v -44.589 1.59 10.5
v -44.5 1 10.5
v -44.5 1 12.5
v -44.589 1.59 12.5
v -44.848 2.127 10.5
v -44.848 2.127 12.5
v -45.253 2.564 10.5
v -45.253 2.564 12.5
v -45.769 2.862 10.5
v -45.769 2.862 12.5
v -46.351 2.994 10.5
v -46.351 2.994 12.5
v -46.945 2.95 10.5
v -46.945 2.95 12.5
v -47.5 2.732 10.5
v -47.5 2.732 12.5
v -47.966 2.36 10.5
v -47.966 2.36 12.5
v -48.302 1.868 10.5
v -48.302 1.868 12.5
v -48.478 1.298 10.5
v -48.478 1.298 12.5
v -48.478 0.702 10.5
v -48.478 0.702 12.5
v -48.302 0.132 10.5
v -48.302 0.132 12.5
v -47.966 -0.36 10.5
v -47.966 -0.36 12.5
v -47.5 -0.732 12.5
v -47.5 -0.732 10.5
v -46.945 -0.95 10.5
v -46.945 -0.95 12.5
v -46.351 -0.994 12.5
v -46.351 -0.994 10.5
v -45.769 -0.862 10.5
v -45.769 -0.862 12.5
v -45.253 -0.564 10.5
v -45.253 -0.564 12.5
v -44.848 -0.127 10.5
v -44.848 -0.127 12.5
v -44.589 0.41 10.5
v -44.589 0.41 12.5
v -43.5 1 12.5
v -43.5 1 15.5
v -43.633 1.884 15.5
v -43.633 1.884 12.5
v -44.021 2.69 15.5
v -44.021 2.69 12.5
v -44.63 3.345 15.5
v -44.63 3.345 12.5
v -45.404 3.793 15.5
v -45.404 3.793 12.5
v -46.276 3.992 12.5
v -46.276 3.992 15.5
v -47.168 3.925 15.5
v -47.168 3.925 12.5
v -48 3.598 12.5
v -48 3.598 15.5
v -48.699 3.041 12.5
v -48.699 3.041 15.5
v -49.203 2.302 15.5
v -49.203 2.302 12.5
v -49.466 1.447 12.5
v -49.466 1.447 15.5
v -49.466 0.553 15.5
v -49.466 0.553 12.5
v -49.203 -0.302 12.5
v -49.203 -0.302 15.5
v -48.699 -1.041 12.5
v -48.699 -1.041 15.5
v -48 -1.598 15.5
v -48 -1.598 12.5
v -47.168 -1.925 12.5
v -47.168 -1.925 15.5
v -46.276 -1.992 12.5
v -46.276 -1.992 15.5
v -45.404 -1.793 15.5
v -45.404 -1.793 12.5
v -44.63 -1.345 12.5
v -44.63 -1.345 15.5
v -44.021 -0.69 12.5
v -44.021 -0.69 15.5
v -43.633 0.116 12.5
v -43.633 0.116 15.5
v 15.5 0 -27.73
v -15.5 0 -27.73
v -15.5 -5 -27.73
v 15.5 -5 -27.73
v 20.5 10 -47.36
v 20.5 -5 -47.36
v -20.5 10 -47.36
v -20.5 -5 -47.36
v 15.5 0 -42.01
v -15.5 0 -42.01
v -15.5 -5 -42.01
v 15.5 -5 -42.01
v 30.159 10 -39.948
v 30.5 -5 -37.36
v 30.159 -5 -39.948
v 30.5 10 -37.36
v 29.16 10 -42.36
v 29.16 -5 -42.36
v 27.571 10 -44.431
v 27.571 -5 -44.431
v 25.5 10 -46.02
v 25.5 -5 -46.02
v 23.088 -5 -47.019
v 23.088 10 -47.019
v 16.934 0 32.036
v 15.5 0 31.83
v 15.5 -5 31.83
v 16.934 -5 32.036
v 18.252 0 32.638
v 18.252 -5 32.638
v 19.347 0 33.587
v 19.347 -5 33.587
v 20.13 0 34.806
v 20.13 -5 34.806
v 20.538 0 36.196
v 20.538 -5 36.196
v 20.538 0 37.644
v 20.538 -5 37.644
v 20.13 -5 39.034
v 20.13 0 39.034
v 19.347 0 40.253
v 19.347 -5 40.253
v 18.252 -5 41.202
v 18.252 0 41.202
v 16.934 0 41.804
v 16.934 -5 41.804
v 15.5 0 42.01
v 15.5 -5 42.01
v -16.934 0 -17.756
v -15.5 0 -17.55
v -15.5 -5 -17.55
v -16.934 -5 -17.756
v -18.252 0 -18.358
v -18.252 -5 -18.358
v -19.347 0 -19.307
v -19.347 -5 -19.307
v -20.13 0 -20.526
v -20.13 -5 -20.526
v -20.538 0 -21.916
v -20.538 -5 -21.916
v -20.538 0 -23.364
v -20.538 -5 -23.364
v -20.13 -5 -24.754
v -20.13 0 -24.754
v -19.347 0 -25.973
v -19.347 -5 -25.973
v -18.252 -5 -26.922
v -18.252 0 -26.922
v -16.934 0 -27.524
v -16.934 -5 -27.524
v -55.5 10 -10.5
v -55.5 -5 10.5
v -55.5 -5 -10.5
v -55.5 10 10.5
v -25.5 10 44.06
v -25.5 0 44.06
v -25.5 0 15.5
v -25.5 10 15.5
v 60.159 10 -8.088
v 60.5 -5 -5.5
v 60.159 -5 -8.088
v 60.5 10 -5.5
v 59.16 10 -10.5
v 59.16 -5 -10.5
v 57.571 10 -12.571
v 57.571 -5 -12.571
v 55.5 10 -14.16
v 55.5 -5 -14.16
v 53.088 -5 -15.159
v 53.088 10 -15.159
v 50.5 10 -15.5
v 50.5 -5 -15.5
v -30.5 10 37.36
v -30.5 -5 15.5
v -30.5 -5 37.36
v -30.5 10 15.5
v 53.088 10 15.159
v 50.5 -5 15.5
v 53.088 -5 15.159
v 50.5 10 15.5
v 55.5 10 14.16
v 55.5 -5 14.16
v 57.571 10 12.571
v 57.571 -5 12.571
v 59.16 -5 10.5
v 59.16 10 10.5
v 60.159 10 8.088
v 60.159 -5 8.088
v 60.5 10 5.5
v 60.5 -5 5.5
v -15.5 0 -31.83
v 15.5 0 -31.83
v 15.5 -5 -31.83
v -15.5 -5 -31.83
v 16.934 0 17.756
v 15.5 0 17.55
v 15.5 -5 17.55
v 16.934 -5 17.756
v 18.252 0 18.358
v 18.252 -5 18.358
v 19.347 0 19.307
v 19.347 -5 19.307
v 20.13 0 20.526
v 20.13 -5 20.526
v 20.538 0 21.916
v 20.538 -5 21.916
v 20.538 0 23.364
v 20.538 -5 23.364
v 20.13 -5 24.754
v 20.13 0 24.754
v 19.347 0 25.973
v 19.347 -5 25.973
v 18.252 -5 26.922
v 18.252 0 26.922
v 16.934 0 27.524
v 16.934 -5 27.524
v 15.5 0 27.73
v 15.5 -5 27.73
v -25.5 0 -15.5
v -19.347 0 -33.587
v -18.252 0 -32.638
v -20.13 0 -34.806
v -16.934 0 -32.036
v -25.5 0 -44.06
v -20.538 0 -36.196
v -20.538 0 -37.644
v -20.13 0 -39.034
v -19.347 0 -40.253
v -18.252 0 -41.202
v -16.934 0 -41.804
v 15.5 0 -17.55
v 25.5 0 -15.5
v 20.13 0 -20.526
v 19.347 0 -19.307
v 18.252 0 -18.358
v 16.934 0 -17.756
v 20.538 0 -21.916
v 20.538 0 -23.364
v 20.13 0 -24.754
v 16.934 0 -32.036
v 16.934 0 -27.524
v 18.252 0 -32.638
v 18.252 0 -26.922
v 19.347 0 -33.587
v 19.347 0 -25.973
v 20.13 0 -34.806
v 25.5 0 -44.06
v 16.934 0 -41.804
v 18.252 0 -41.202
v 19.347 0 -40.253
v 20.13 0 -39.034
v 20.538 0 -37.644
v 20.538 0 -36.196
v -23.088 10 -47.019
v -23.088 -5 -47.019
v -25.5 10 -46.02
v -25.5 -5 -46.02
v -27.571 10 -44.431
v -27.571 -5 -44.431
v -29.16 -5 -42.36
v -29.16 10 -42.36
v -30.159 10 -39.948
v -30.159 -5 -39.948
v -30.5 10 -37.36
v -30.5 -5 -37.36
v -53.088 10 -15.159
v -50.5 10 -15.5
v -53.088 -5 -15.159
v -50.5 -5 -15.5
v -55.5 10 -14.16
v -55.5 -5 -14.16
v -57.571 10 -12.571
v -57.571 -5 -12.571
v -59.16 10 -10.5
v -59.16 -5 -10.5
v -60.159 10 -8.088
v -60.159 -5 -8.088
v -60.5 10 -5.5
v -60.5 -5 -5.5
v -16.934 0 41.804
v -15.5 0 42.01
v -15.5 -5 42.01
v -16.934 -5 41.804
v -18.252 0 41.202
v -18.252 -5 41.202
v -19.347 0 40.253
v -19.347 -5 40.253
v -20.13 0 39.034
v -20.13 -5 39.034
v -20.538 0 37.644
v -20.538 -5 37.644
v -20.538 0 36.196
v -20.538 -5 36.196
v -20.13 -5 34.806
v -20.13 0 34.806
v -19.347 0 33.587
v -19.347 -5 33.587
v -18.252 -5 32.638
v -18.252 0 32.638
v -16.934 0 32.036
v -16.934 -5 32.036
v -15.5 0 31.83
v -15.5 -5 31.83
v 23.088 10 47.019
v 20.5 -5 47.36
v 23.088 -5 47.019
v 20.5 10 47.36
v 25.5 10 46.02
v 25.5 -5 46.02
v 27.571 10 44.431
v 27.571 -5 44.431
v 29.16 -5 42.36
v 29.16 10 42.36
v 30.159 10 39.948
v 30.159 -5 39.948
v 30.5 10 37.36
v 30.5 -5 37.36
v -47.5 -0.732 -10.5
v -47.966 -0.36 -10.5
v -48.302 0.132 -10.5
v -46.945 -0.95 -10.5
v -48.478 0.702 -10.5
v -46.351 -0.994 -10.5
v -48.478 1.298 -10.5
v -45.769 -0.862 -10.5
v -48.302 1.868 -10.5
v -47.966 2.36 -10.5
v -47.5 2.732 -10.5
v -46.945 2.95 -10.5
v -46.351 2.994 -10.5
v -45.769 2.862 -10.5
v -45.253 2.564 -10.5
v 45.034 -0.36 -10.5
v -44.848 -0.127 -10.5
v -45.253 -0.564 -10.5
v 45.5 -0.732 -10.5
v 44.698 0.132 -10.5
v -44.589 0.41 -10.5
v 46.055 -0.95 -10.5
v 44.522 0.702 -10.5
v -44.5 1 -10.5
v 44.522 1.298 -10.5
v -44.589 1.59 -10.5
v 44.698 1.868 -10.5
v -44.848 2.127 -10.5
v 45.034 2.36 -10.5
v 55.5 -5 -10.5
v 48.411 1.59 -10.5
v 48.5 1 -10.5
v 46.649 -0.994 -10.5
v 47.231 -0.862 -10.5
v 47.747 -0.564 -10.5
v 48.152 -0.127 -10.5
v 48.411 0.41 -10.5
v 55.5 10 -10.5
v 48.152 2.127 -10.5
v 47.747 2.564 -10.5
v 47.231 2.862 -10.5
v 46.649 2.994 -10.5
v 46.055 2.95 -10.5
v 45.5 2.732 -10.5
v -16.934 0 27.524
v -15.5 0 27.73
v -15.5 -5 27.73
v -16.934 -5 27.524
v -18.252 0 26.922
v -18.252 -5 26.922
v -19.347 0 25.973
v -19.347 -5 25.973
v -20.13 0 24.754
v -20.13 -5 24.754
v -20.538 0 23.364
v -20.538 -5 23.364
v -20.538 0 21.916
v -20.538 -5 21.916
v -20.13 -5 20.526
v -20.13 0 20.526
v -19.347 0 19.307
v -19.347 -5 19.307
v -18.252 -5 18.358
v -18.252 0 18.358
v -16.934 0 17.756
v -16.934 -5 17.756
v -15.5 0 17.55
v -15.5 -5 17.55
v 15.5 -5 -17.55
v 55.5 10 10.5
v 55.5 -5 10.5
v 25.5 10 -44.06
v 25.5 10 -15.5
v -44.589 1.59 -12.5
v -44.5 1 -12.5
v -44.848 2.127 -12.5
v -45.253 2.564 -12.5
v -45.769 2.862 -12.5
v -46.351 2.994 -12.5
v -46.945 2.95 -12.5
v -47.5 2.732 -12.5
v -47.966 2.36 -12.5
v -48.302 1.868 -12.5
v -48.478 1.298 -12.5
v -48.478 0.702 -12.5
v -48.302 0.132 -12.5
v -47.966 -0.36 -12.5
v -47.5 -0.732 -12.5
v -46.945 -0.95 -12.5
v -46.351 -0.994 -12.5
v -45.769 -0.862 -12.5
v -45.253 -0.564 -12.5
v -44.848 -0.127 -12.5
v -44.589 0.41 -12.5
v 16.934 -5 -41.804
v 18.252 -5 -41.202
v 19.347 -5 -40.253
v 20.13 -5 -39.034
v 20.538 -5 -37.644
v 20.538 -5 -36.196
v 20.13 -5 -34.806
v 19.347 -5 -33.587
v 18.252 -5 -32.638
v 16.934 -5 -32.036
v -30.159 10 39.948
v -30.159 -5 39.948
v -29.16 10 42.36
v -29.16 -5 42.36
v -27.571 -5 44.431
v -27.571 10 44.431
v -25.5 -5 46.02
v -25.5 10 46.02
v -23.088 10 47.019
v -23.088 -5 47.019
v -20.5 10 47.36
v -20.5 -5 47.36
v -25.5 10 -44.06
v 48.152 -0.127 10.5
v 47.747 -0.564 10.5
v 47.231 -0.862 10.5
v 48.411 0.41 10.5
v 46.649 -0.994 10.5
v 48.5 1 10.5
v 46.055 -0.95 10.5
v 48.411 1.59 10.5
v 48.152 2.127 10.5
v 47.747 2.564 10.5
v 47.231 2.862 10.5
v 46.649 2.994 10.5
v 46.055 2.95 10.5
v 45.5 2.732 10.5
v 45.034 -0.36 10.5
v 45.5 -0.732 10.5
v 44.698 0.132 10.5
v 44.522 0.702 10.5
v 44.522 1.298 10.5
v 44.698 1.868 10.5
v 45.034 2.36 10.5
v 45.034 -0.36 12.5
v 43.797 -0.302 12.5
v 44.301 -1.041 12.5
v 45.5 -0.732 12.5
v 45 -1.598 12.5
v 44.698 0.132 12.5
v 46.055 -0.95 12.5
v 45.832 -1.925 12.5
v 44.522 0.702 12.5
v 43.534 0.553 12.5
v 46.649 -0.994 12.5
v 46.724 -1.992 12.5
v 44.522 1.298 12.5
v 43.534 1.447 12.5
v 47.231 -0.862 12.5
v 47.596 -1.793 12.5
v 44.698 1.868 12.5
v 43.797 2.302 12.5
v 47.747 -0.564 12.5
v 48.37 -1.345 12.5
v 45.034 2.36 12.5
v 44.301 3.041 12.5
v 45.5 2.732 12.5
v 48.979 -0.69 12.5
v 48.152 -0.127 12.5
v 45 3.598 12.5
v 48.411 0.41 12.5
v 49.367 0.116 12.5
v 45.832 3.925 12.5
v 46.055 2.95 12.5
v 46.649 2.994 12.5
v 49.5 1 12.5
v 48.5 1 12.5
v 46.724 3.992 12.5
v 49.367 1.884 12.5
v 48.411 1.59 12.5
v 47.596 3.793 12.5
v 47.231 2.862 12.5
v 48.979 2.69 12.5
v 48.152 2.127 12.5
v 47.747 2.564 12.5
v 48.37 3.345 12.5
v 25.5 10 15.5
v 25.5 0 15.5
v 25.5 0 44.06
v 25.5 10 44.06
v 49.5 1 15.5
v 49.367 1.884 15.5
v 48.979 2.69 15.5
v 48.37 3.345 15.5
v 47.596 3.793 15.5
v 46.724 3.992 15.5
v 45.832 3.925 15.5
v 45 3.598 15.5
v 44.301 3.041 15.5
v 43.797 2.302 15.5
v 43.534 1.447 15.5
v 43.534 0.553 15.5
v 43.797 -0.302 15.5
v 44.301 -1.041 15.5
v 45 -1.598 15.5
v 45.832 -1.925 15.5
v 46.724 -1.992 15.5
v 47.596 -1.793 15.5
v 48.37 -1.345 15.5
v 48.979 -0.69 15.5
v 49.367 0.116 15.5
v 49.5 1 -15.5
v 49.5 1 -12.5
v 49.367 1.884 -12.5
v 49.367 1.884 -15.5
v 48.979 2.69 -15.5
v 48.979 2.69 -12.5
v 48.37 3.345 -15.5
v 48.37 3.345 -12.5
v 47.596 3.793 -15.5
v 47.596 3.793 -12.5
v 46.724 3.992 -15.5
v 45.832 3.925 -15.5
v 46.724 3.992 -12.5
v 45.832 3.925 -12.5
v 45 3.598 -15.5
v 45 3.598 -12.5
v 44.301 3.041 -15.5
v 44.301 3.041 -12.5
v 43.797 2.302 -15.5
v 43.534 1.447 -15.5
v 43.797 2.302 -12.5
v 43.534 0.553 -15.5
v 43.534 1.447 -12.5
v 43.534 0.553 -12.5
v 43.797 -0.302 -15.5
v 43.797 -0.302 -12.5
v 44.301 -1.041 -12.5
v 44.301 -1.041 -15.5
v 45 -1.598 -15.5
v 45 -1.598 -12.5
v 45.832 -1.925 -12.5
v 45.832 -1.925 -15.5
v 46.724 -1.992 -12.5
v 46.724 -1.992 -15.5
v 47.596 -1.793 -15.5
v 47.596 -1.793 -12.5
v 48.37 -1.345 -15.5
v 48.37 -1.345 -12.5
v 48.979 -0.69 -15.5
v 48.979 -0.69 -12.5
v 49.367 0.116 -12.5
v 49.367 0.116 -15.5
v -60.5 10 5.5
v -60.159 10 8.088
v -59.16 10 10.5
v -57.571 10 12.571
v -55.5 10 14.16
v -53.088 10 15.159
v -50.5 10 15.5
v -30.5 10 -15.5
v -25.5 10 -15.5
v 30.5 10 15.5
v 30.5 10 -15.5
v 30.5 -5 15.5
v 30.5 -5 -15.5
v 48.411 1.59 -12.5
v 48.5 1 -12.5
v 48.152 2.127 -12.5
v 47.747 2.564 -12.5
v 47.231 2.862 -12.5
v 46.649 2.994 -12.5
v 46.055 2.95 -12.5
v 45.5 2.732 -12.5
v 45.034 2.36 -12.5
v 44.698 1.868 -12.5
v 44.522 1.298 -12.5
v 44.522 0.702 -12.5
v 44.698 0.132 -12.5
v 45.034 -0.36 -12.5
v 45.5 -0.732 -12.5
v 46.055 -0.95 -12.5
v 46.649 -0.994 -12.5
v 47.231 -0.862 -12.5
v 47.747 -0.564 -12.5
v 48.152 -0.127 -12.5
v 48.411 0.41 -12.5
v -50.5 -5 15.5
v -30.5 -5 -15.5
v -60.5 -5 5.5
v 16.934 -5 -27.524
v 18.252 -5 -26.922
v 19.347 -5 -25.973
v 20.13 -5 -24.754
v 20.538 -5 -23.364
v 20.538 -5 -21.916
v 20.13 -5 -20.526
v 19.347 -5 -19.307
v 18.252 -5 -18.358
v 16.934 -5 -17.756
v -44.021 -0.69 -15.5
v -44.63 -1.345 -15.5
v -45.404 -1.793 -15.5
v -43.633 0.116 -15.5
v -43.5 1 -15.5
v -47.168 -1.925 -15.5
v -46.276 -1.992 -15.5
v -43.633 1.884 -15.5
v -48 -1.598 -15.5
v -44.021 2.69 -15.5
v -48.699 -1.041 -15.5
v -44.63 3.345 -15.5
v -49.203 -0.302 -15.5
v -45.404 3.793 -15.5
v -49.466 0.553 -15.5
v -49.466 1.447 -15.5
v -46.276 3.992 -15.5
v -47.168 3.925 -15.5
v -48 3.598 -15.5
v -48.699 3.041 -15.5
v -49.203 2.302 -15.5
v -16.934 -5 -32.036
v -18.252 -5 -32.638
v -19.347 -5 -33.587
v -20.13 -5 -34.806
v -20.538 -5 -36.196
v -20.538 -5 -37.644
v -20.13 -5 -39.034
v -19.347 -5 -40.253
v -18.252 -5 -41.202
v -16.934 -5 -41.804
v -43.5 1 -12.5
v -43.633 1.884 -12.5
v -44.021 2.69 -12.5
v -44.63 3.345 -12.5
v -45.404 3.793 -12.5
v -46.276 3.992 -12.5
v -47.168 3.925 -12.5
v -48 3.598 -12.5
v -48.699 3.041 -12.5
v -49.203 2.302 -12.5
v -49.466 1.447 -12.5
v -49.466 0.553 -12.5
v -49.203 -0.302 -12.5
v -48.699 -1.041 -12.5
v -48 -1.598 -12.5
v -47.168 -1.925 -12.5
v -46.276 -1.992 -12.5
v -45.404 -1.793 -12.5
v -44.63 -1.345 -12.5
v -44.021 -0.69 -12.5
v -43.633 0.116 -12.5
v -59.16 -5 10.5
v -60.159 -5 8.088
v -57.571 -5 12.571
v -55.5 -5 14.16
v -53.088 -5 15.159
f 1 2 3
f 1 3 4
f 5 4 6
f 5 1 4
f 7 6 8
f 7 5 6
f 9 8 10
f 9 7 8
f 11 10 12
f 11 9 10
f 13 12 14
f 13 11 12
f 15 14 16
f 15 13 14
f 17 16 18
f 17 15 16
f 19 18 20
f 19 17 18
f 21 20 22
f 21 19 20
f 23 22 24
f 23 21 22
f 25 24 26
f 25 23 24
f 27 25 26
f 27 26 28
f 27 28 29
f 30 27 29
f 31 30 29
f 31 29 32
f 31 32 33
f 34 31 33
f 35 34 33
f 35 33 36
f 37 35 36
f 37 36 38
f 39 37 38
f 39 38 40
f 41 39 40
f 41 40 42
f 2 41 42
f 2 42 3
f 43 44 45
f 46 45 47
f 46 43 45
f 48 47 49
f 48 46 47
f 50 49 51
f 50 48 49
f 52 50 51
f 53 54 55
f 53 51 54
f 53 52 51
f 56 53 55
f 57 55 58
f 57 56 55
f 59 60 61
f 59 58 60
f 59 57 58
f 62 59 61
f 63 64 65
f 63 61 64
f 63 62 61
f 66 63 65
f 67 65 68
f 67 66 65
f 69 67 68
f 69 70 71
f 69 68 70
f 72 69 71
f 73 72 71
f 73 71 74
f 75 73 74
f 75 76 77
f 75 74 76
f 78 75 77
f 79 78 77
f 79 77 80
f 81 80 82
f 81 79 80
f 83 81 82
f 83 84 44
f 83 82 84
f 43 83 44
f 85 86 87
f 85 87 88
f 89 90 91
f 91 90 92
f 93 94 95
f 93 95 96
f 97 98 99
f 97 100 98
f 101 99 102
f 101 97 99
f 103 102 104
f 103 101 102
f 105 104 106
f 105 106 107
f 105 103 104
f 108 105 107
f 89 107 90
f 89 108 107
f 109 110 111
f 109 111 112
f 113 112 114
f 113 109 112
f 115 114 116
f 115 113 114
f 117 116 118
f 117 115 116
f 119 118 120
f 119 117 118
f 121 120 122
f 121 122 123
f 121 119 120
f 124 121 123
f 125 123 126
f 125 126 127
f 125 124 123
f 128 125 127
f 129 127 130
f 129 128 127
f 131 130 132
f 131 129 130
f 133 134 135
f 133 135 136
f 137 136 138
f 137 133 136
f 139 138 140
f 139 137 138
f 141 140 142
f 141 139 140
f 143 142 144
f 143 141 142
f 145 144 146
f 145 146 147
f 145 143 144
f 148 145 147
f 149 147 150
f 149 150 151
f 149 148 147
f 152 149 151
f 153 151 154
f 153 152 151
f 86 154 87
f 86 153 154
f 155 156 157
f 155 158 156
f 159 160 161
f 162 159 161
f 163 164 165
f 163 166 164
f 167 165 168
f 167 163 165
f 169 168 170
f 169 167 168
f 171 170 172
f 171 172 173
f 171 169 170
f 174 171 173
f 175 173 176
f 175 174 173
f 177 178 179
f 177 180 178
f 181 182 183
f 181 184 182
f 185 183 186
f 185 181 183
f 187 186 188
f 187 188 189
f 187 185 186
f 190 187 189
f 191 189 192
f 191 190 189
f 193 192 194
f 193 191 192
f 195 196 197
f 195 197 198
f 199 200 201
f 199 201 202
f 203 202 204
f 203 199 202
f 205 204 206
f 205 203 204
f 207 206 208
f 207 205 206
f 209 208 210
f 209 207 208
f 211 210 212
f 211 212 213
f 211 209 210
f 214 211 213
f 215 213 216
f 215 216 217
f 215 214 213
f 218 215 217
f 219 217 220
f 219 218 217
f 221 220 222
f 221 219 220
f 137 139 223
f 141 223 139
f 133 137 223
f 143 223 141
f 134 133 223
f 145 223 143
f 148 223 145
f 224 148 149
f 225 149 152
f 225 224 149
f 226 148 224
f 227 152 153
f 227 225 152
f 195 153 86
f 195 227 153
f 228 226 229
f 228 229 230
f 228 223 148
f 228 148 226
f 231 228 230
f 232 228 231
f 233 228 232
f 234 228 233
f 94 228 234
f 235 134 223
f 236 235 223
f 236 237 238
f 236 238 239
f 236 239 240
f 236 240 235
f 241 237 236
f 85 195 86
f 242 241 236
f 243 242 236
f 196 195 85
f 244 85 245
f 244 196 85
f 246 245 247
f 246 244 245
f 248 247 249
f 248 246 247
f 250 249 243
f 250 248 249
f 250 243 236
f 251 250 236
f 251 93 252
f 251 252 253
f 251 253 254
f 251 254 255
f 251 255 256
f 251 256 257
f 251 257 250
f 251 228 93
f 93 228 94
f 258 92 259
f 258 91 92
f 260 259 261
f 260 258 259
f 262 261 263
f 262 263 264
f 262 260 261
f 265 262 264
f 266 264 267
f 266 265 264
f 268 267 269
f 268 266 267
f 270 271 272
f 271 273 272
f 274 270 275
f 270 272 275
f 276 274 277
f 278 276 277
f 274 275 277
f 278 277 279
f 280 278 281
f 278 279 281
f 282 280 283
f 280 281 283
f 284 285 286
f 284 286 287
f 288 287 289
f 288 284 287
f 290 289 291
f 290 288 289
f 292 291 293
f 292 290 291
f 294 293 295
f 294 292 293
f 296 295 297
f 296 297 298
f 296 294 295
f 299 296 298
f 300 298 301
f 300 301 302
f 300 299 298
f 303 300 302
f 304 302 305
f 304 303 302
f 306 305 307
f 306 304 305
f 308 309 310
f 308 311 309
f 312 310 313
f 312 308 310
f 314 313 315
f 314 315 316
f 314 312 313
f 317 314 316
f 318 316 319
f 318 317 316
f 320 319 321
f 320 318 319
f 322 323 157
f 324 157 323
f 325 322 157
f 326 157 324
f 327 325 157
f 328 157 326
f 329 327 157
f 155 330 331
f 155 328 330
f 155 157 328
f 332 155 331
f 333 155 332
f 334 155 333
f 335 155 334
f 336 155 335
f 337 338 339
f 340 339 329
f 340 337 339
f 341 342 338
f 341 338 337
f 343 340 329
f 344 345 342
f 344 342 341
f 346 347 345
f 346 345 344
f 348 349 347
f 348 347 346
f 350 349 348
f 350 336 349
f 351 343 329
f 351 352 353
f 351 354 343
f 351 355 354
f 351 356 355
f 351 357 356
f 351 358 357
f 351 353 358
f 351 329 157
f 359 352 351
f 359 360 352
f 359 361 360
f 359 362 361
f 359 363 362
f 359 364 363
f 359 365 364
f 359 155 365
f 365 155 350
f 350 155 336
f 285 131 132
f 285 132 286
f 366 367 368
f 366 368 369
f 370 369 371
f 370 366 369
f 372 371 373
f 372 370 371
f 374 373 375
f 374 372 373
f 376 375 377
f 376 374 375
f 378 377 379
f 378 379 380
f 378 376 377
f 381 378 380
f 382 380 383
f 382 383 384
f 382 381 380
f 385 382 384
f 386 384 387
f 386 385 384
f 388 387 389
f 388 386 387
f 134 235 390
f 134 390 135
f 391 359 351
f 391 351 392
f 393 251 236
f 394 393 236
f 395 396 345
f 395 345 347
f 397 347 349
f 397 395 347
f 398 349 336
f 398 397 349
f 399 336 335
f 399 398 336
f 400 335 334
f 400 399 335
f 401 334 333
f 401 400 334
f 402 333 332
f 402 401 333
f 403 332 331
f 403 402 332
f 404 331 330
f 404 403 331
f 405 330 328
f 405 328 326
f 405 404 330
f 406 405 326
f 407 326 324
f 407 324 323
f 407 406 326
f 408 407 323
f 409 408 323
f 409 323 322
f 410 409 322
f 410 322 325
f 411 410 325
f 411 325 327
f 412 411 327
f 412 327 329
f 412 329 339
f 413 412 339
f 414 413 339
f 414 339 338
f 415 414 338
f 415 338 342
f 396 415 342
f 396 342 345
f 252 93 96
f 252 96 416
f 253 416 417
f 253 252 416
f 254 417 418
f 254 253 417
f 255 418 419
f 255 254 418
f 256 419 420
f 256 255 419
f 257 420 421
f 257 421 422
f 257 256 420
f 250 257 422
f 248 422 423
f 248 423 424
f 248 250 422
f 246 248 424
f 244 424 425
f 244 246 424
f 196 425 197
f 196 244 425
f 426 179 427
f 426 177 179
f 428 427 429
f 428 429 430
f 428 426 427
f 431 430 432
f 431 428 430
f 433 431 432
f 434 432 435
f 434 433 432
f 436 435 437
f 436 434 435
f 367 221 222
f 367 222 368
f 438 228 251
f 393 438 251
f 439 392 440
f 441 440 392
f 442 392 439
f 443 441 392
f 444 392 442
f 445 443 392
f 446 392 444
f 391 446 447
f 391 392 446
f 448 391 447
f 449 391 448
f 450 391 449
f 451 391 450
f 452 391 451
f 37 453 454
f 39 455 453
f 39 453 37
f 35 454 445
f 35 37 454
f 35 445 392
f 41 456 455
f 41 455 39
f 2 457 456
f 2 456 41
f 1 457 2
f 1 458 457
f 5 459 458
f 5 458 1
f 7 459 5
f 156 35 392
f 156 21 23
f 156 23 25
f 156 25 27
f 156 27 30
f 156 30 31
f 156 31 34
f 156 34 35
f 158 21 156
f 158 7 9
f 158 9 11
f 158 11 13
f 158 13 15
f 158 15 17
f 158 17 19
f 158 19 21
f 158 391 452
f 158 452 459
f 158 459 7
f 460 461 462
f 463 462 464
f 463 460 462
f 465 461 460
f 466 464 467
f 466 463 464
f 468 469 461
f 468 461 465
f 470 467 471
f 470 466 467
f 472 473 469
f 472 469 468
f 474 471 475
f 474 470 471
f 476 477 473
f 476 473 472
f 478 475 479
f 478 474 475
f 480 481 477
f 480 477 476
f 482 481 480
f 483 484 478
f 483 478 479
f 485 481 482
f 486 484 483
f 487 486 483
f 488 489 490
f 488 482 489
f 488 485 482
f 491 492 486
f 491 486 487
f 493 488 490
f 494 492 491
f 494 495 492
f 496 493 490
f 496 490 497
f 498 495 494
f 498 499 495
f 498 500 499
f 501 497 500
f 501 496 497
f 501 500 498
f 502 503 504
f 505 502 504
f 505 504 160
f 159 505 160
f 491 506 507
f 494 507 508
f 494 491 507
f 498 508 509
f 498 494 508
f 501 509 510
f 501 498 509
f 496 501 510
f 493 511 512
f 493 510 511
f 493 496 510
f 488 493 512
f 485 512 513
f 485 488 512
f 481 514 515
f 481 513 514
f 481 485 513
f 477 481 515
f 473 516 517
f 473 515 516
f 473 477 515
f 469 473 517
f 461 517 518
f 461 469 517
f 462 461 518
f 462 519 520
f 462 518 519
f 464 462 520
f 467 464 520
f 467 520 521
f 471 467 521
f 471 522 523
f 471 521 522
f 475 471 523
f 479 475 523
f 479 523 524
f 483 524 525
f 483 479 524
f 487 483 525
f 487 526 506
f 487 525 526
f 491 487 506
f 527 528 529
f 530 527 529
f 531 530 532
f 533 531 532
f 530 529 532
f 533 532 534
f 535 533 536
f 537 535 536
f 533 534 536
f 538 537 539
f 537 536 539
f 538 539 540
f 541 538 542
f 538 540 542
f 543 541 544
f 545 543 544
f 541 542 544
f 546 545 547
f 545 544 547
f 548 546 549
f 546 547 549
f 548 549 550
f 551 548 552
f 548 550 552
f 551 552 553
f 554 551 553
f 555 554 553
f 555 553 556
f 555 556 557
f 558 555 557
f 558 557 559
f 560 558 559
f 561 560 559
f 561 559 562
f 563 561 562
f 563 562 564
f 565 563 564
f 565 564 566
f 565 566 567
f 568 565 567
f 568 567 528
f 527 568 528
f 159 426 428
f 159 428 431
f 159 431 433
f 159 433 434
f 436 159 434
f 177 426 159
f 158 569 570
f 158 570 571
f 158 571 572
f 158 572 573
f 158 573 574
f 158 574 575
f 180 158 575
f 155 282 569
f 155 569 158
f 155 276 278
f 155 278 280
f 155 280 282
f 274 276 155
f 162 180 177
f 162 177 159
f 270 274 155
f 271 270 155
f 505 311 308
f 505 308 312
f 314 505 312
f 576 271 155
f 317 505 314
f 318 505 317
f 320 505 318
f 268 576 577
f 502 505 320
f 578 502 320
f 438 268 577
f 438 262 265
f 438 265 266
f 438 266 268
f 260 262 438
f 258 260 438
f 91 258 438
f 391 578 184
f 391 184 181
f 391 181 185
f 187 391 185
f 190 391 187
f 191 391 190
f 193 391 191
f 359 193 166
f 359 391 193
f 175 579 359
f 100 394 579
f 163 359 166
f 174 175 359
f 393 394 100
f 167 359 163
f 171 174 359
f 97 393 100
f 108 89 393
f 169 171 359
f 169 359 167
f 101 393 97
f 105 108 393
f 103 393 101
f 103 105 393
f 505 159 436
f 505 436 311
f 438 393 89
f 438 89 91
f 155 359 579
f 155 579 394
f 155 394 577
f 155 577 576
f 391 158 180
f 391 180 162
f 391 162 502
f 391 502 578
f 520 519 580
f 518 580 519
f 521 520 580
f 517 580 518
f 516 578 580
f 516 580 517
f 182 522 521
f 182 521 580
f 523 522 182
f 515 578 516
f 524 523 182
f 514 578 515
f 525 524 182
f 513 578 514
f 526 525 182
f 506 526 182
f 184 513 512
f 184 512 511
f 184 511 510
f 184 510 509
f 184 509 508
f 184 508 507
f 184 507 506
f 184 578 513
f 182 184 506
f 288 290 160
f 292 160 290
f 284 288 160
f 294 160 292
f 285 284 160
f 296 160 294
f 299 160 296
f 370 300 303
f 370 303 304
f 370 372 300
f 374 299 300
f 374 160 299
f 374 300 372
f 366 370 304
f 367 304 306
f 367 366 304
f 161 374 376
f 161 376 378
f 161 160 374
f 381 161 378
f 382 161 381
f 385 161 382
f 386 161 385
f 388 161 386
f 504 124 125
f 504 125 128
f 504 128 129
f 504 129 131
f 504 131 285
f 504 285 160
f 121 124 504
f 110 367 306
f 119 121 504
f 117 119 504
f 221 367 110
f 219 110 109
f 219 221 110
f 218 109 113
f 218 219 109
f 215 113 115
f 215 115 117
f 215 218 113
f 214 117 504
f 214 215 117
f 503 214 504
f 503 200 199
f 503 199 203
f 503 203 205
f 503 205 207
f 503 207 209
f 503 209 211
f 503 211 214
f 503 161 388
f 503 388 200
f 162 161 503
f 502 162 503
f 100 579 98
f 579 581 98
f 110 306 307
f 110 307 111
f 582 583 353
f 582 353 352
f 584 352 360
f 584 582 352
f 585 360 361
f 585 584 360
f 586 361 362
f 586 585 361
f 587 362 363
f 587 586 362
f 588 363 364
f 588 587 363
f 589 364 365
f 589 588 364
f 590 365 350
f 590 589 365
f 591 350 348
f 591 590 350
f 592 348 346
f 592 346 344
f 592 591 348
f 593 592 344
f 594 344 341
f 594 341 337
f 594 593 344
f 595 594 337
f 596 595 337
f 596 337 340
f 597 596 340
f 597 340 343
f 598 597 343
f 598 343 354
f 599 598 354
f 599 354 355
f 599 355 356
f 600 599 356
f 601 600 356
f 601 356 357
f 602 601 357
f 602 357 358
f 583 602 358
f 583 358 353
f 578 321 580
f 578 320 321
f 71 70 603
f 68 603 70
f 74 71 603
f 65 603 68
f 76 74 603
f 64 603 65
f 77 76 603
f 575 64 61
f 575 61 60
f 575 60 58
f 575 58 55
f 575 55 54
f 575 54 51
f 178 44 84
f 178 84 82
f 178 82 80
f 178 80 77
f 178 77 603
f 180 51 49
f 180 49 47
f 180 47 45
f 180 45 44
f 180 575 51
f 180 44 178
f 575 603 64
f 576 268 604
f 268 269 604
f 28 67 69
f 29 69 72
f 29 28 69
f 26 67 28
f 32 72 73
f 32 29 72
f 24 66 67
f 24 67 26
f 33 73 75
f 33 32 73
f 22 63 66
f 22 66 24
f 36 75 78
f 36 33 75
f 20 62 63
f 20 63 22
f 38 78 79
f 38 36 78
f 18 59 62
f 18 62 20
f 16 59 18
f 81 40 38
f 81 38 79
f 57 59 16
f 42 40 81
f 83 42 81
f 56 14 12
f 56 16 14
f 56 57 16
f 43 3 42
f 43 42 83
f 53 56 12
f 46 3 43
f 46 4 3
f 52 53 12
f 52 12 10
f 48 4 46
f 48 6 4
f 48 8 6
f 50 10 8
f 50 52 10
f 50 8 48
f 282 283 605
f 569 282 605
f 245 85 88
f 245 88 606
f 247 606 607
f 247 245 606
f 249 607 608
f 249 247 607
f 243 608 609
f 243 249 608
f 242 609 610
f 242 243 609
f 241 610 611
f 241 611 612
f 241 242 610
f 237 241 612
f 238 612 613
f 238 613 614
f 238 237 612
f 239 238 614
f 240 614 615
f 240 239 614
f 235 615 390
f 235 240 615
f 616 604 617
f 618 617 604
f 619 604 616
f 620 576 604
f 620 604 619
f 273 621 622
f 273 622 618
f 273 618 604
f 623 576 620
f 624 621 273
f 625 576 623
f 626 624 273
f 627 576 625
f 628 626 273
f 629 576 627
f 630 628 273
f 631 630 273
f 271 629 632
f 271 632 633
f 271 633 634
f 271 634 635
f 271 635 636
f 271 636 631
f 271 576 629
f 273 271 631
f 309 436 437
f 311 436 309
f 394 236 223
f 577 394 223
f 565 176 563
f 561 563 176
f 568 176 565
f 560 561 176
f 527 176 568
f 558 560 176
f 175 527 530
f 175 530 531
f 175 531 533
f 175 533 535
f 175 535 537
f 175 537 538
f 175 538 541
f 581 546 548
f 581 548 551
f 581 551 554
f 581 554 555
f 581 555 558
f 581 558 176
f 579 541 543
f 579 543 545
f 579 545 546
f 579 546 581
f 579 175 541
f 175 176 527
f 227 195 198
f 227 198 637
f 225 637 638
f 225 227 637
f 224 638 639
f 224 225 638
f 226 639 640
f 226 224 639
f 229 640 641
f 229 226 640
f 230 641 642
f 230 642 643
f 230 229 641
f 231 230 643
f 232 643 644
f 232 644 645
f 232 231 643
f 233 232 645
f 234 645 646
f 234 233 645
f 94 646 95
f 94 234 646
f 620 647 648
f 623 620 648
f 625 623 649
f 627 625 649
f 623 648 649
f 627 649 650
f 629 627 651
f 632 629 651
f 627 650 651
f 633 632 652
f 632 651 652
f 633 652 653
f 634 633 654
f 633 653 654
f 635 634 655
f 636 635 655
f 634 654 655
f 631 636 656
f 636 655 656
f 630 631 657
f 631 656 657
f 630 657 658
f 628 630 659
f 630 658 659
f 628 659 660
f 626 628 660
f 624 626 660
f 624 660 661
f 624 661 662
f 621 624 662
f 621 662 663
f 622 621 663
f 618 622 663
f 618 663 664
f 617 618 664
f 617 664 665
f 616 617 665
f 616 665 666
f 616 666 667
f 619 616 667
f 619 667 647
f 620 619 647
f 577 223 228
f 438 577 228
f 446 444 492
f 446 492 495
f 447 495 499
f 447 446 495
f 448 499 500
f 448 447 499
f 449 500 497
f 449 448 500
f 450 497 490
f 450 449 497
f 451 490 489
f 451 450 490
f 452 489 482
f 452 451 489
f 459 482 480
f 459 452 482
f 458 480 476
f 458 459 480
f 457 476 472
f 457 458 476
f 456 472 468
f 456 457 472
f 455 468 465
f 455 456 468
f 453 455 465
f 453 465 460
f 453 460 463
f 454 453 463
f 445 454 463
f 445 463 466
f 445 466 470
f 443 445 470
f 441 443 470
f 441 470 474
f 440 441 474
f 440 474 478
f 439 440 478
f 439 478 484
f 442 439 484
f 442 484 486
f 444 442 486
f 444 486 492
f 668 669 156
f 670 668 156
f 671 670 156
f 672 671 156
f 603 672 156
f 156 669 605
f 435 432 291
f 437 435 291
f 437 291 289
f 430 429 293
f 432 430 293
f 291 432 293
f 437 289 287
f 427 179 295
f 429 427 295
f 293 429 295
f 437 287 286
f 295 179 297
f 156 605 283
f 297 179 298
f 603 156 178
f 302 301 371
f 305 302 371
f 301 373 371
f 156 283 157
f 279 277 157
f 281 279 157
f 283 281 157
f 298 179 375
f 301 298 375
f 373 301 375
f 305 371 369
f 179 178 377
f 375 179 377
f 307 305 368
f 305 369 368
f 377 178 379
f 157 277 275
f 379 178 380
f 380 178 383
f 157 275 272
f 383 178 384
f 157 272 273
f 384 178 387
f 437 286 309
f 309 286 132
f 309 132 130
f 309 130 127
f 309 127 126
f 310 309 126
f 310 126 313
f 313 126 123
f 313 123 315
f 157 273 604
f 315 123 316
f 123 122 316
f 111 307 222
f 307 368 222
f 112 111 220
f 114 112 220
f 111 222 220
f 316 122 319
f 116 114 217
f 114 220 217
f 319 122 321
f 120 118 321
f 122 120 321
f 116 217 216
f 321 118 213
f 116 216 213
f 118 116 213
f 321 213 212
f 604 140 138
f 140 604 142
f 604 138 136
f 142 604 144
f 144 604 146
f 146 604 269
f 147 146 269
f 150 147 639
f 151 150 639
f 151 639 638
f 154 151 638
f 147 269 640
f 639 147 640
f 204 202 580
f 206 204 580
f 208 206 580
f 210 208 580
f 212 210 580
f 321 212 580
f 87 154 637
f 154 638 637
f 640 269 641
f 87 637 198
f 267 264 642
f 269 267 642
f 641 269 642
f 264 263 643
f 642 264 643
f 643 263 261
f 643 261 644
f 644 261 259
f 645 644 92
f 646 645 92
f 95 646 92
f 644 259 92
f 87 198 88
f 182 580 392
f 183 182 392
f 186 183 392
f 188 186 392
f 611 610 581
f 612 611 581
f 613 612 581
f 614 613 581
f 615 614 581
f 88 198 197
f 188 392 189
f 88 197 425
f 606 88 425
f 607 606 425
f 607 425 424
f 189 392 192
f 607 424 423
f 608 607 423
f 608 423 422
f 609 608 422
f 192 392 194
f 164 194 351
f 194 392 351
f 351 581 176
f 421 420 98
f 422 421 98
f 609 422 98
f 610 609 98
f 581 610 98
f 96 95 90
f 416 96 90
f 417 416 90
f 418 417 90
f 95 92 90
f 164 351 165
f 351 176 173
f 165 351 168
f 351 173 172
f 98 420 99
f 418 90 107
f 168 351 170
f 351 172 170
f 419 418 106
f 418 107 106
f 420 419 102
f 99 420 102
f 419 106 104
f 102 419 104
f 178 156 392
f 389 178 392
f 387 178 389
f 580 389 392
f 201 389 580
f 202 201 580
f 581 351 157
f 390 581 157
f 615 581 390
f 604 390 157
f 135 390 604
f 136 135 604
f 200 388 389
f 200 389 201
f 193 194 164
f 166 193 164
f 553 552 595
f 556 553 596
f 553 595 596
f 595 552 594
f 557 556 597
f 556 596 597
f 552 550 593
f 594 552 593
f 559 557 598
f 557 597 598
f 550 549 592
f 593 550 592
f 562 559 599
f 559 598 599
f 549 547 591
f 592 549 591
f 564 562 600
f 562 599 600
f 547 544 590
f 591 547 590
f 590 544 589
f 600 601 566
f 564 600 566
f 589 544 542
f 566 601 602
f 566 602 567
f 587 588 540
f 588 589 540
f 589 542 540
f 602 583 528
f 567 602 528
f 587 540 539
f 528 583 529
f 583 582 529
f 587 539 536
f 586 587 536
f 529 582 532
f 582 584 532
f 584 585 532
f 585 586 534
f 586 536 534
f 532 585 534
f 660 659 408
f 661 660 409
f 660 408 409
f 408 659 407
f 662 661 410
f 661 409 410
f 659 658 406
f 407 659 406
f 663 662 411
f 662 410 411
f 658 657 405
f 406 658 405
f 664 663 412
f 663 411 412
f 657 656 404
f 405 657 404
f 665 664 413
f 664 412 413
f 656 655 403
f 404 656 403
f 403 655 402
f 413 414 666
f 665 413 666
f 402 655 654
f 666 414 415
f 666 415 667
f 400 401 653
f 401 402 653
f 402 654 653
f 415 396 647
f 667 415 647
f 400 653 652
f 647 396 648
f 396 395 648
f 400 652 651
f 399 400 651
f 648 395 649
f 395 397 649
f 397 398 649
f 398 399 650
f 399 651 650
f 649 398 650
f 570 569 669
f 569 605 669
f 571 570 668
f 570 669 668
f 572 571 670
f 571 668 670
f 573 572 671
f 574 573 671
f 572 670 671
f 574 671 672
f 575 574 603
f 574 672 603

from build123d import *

# Parameters (mm, degrees)
BOSS_EXTRUDE1_DEPTH            = 10
SKETCH1_3_W                    = 51
SKETCH1_3_H                    = 28.56
BOSS_EXTRUDE2_DEPTH            = 5
CUT_EXTRUDE1_REACH             = 79.48
SKETCH3_R                      = 3
SKETCH3_R_2                    = 2
CUT_EXTRUDE1_DIRECTION_2_REACH = 79.48
BOSS_EXTRUDE3_DEPTH            = 12.5
BOSS_EXTRUDE3_DEPTH_BACK       = 12.5
SKETCH3_5_R                    = 3
SKETCH3_5_R_2                  = 2
CUT_EXTRUDE5_DEPTH             = 10.5
CUT_EXTRUDE5_DEPTH_BACK        = 10.5
SKETCH3_12_R                   = 3
SKETCH3_12_R_2                 = 2
FILLET1_R                      = 10


with BuildPart() as part:
    # Sketch1 → Boss-Extrude1 (new body)
    # profile 1 of 3: a face of its own
    with BuildSketch(Plane(origin=(0, 0, 0), x_dir=(1, 0, 0), z_dir=(0, 1, 0))):
        Polygon((-30.5, 47.36), (-30.5, 15.5), (-25.5, 15.5), (-25.5, 44.06), (25.5, 44.06), (25.5, 15.5), (30.5, 15.5), (30.5, 47.36), align=None)
    # profile 2 of 3: a face of its own
    with BuildSketch(Plane(origin=(0, 0, 0), x_dir=(1, 0, 0), z_dir=(0, 1, 0))):
        Polygon((30.5, 15.5), (-30.5, 15.5), (-60.5, 15.5), (-60.5, -15.5), (-30.5, -15.5), (30.5, -15.5), (60.5, -15.5), (60.5, 15.5), align=None)
        Polygon((30.5, 10.5), (-30.5, 10.5), (-55.5, 10.5), (-55.5, -10.5), (-30.5, -10.5), (30.5, -10.5), (55.5, -10.5), (55.5, 10.5), align=None, mode=Mode.SUBTRACT)
    # profile 3 of 3: a face of its own
    with BuildSketch(Plane(origin=(0, 0, 0), x_dir=(1, 0, 0), z_dir=(0, 1, 0))):
        Polygon((-30.5, -15.5), (-30.5, -47.36), (30.5, -47.36), (30.5, -15.5), (25.5, -15.5), (25.5, -44.06), (-25.5, -44.06), (-25.5, -15.5), align=None)
    extrude(amount=BOSS_EXTRUDE1_DEPTH)

    # Sketch1<3> → Boss-Extrude2 (add)
    # profile 1 of 5: a face of its own
    with BuildSketch(Plane(origin=(0, 0, 0), x_dir=(1, 0, 0), z_dir=(0, 1, 0))):
        Polygon((-30.5, -15.5), (-30.5, -47.36), (30.5, -47.36), (30.5, -15.5), (25.5, -15.5), (25.5, -44.06), (-25.5, -44.06), (-25.5, -15.5), align=None)
    # profile 2 of 5: a face of its own
    with BuildSketch(Plane(origin=(0, 0, 0), x_dir=(1, 0, 0), z_dir=(0, 1, 0))):
        Polygon((-60.5, -15.5), (-30.5, -15.5), (-25.5, -15.5), (25.5, -15.5), (30.5, -15.5), (60.5, -15.5), (60.5, 15.5), (30.5, 15.5), (25.5, 15.5), (-25.5, 15.5), (-30.5, 15.5), (-60.5, 15.5), align=None)
        Polygon((-55.5, 10.5), (-30.5, 10.5), (30.5, 10.5), (55.5, 10.5), (55.5, -10.5), (30.5, -10.5), (-30.5, -10.5), (-55.5, -10.5), align=None, mode=Mode.SUBTRACT)
    # profile 3 of 5: a face of its own
    with BuildSketch(Plane(origin=(0, 0, 0), x_dir=(1, 0, 0), z_dir=(0, 1, 0))):
        with Locations((0, -29.78)):
            Rectangle(SKETCH1_3_W, SKETCH1_3_H)
        with BuildLine():
            ThreePointArc((-15.5, -27.73), (-20.59, -22.64), (-15.5, -17.55))
            Line((-15.5, -17.55), (15.5, -17.55))
            ThreePointArc((15.5, -17.55), (20.59, -22.64), (15.5, -27.73))
            Line((15.5, -27.73), (-15.5, -27.73))
        make_face(mode=Mode.SUBTRACT)
        with BuildLine():
            Line((15.5, -42.01), (-15.5, -42.01))
            ThreePointArc((-15.5, -42.01), (-20.59, -36.92), (-15.5, -31.83))
            Line((-15.5, -31.83), (15.5, -31.83))
            ThreePointArc((15.5, -31.83), (20.59, -36.92), (15.5, -42.01))
        make_face(mode=Mode.SUBTRACT)
    # profile 4 of 5: a face of its own
    with BuildSketch(Plane(origin=(0, 0, 0), x_dir=(1, 0, 0), z_dir=(0, 1, 0))):
        Polygon((-30.5, 47.36), (-30.5, 15.5), (-25.5, 15.5), (-25.5, 44.06), (25.5, 44.06), (25.5, 15.5), (30.5, 15.5), (30.5, 47.36), align=None)
    # profile 5 of 5: a face of its own
    with BuildSketch(Plane(origin=(0, 0, 0), x_dir=(1, 0, 0), z_dir=(0, 1, 0))):
        with Locations((0, 29.78)):
            Rectangle(SKETCH1_3_W, SKETCH1_3_H)
        with BuildLine():
            Line((15.5, 17.55), (-15.5, 17.55))
            ThreePointArc((-15.5, 17.55), (-20.59, 22.64), (-15.5, 27.73))
            Line((-15.5, 27.73), (15.5, 27.73))
            ThreePointArc((15.5, 27.73), (20.59, 22.64), (15.5, 17.55))
        make_face(mode=Mode.SUBTRACT)
        with BuildLine():
            ThreePointArc((-15.5, 31.83), (-20.59, 36.92), (-15.5, 42.01))
            Line((-15.5, 42.01), (15.5, 42.01))
            ThreePointArc((15.5, 42.01), (20.59, 36.92), (15.5, 31.83))
            Line((15.5, 31.83), (-15.5, 31.83))
        make_face(mode=Mode.SUBTRACT)
    extrude(amount=-BOSS_EXTRUDE2_DEPTH)

    # Cut-Extrude1: up to this face of the body (flat: up to its plane)
    cut_extrude1_end = Plane(part.part.faces().sort_by_distance((-45.5, 2.5, -15.5))[0])
    # Sketch3 → Cut-Extrude1 (cut, up to the picked face)
    with BuildSketch(Plane.XY, mode=Mode.PRIVATE) as cut_extrude1_sk1:
        with Locations((-46.5, 1)):
            Circle(SKETCH3_R)
        with Locations((-46.5, 1)):
            Circle(SKETCH3_R_2, mode=Mode.SUBTRACT)
    cut_extrude1_tool1 = split(extrude(cut_extrude1_sk1.sketch, amount=-CUT_EXTRUDE1_REACH, mode=Mode.PRIVATE), bisect_by=cut_extrude1_end, keep=Keep.BOTH, mode=Mode.PRIVATE)
    # Sketch3 → Cut-Extrude1 (cut, up to the picked face)
    with BuildSketch(Plane.XY, mode=Mode.PRIVATE) as cut_extrude1_sk2:
        with Locations((-46.5, 1)):
            Circle(SKETCH3_R_2)
    cut_extrude1_tool2 = split(extrude(cut_extrude1_sk2.sketch, amount=-CUT_EXTRUDE1_REACH, mode=Mode.PRIVATE), bisect_by=cut_extrude1_end, keep=Keep.BOTH, mode=Mode.PRIVATE)
    # Sketch3 → Cut-Extrude1 (cut, up to the picked face)
    with BuildSketch(Plane.XY, mode=Mode.PRIVATE) as cut_extrude1_sk3:
        with Locations((46.5, 1)):
            Circle(SKETCH3_R)
        with Locations((46.5, 1)):
            Circle(SKETCH3_R_2, mode=Mode.SUBTRACT)
    cut_extrude1_tool3 = split(extrude(cut_extrude1_sk3.sketch, amount=-CUT_EXTRUDE1_REACH, mode=Mode.PRIVATE), bisect_by=cut_extrude1_end, keep=Keep.BOTH, mode=Mode.PRIVATE)
    # Sketch3 → Cut-Extrude1 (cut, up to the picked face)
    with BuildSketch(Plane.XY, mode=Mode.PRIVATE) as cut_extrude1_sk4:
        with Locations((46.5, 1)):
            Circle(SKETCH3_R_2)
    cut_extrude1_tool4 = split(extrude(cut_extrude1_sk4.sketch, amount=-CUT_EXTRUDE1_REACH, mode=Mode.PRIVATE), bisect_by=cut_extrude1_end, keep=Keep.BOTH, mode=Mode.PRIVATE)
    add(cut_extrude1_tool1.solids().sort_by(Axis((-49.415147, 1, 0), (0, 0, -1)))[0], mode=Mode.SUBTRACT)
    add(cut_extrude1_tool2.solids().sort_by(Axis((-46.5, 1, 0), (0, 0, -1)))[0], mode=Mode.SUBTRACT)
    add(cut_extrude1_tool3.solids().sort_by(Axis((43.584853, 1, 0), (0, 0, -1)))[0], mode=Mode.SUBTRACT)
    add(cut_extrude1_tool4.solids().sort_by(Axis((46.5, 1, 0), (0, 0, -1)))[0], mode=Mode.SUBTRACT)

    # Cut-Extrude1 direction 2: up to this face of the body (flat: up to its plane)
    cut_extrude1_direction_2_end = Plane(part.part.faces().sort_by_distance((-45.5, 2.5, 15.5))[0])
    # Sketch3 → Cut-Extrude1 direction 2 (cut, up to the picked face)
    with BuildSketch(Plane.XY, mode=Mode.PRIVATE) as cut_extrude1_direction_2_sk1:
        with Locations((-46.5, 1)):
            Circle(SKETCH3_R)
        with Locations((-46.5, 1)):
            Circle(SKETCH3_R_2, mode=Mode.SUBTRACT)
    cut_extrude1_direction_2_tool1 = split(extrude(cut_extrude1_direction_2_sk1.sketch, amount=CUT_EXTRUDE1_DIRECTION_2_REACH, mode=Mode.PRIVATE), bisect_by=cut_extrude1_direction_2_end, keep=Keep.BOTH, mode=Mode.PRIVATE)
    # Sketch3 → Cut-Extrude1 direction 2 (cut, up to the picked face)
    with BuildSketch(Plane.XY, mode=Mode.PRIVATE) as cut_extrude1_direction_2_sk2:
        with Locations((-46.5, 1)):
            Circle(SKETCH3_R_2)
    cut_extrude1_direction_2_tool2 = split(extrude(cut_extrude1_direction_2_sk2.sketch, amount=CUT_EXTRUDE1_DIRECTION_2_REACH, mode=Mode.PRIVATE), bisect_by=cut_extrude1_direction_2_end, keep=Keep.BOTH, mode=Mode.PRIVATE)
    # Sketch3 → Cut-Extrude1 direction 2 (cut, up to the picked face)
    with BuildSketch(Plane.XY, mode=Mode.PRIVATE) as cut_extrude1_direction_2_sk3:
        with Locations((46.5, 1)):
            Circle(SKETCH3_R)
        with Locations((46.5, 1)):
            Circle(SKETCH3_R_2, mode=Mode.SUBTRACT)
    cut_extrude1_direction_2_tool3 = split(extrude(cut_extrude1_direction_2_sk3.sketch, amount=CUT_EXTRUDE1_DIRECTION_2_REACH, mode=Mode.PRIVATE), bisect_by=cut_extrude1_direction_2_end, keep=Keep.BOTH, mode=Mode.PRIVATE)
    # Sketch3 → Cut-Extrude1 direction 2 (cut, up to the picked face)
    with BuildSketch(Plane.XY, mode=Mode.PRIVATE) as cut_extrude1_direction_2_sk4:
        with Locations((46.5, 1)):
            Circle(SKETCH3_R_2)
    cut_extrude1_direction_2_tool4 = split(extrude(cut_extrude1_direction_2_sk4.sketch, amount=CUT_EXTRUDE1_DIRECTION_2_REACH, mode=Mode.PRIVATE), bisect_by=cut_extrude1_direction_2_end, keep=Keep.BOTH, mode=Mode.PRIVATE)
    add(cut_extrude1_direction_2_tool1.solids().sort_by(Axis((-49.415147, 1, 0), (0, 0, 1)))[0], mode=Mode.SUBTRACT)
    add(cut_extrude1_direction_2_tool2.solids().sort_by(Axis((-46.5, 1, 0), (0, 0, 1)))[0], mode=Mode.SUBTRACT)
    add(cut_extrude1_direction_2_tool3.solids().sort_by(Axis((43.584853, 1, 0), (0, 0, 1)))[0], mode=Mode.SUBTRACT)
    add(cut_extrude1_direction_2_tool4.solids().sort_by(Axis((46.5, 1, 0), (0, 0, 1)))[0], mode=Mode.SUBTRACT)

    # Sketch3<5> → Boss-Extrude3 (add, two sides: drawn at the far end of the back side and taken through both)
    # profile 1 of 2: a face of its own
    with BuildSketch(Plane.XY.offset(-BOSS_EXTRUDE3_DEPTH_BACK)):
        with Locations((-46.5, 1)):
            Circle(SKETCH3_5_R)
        with Locations((-46.5, 1)):
            Circle(SKETCH3_5_R_2, mode=Mode.SUBTRACT)
    # profile 2 of 2: a face of its own
    with BuildSketch(Plane.XY.offset(-BOSS_EXTRUDE3_DEPTH_BACK)):
        with Locations((46.5, 1)):
            Circle(SKETCH3_5_R)
        with Locations((46.5, 1)):
            Circle(SKETCH3_5_R_2, mode=Mode.SUBTRACT)
    extrude(amount=BOSS_EXTRUDE3_DEPTH + BOSS_EXTRUDE3_DEPTH_BACK)

    # Sketch3<12> → Cut-Extrude5 (cut, two sides: drawn at the far end of the back side and taken through both)
    # profile 1 of 2: a face of its own
    with BuildSketch(Plane.XY.offset(-CUT_EXTRUDE5_DEPTH_BACK)):
        with Locations((46.5, 1)):
            Circle(SKETCH3_12_R)
        with Locations((46.5, 1)):
            Circle(SKETCH3_12_R_2, mode=Mode.SUBTRACT)
    # profile 2 of 2: a face of its own
    with BuildSketch(Plane.XY.offset(-CUT_EXTRUDE5_DEPTH_BACK)):
        with Locations((-46.5, 1)):
            Circle(SKETCH3_12_R)
        with Locations((-46.5, 1)):
            Circle(SKETCH3_12_R_2, mode=Mode.SUBTRACT)
    extrude(amount=CUT_EXTRUDE5_DEPTH + CUT_EXTRUDE5_DEPTH_BACK, mode=Mode.SUBTRACT)

    # Fillet1
    fillet1_edges = [part.edges().sort_by_distance(p)[0] for p in [
        (60.5, 2.5, -15.5),
        (60.5, 2.5, 15.5),
        (30.5, 2.5, 47.36),
        (-30.5, 2.5, 47.36),
        (-60.5, 2.5, 15.5),
        (-60.5, 2.5, -15.5),
        (-30.5, 2.5, -47.36),
        (30.5, 2.5, -47.36),
    ]]
    fillet(fillet1_edges, radius=FILLET1_R)


solid = part.part
